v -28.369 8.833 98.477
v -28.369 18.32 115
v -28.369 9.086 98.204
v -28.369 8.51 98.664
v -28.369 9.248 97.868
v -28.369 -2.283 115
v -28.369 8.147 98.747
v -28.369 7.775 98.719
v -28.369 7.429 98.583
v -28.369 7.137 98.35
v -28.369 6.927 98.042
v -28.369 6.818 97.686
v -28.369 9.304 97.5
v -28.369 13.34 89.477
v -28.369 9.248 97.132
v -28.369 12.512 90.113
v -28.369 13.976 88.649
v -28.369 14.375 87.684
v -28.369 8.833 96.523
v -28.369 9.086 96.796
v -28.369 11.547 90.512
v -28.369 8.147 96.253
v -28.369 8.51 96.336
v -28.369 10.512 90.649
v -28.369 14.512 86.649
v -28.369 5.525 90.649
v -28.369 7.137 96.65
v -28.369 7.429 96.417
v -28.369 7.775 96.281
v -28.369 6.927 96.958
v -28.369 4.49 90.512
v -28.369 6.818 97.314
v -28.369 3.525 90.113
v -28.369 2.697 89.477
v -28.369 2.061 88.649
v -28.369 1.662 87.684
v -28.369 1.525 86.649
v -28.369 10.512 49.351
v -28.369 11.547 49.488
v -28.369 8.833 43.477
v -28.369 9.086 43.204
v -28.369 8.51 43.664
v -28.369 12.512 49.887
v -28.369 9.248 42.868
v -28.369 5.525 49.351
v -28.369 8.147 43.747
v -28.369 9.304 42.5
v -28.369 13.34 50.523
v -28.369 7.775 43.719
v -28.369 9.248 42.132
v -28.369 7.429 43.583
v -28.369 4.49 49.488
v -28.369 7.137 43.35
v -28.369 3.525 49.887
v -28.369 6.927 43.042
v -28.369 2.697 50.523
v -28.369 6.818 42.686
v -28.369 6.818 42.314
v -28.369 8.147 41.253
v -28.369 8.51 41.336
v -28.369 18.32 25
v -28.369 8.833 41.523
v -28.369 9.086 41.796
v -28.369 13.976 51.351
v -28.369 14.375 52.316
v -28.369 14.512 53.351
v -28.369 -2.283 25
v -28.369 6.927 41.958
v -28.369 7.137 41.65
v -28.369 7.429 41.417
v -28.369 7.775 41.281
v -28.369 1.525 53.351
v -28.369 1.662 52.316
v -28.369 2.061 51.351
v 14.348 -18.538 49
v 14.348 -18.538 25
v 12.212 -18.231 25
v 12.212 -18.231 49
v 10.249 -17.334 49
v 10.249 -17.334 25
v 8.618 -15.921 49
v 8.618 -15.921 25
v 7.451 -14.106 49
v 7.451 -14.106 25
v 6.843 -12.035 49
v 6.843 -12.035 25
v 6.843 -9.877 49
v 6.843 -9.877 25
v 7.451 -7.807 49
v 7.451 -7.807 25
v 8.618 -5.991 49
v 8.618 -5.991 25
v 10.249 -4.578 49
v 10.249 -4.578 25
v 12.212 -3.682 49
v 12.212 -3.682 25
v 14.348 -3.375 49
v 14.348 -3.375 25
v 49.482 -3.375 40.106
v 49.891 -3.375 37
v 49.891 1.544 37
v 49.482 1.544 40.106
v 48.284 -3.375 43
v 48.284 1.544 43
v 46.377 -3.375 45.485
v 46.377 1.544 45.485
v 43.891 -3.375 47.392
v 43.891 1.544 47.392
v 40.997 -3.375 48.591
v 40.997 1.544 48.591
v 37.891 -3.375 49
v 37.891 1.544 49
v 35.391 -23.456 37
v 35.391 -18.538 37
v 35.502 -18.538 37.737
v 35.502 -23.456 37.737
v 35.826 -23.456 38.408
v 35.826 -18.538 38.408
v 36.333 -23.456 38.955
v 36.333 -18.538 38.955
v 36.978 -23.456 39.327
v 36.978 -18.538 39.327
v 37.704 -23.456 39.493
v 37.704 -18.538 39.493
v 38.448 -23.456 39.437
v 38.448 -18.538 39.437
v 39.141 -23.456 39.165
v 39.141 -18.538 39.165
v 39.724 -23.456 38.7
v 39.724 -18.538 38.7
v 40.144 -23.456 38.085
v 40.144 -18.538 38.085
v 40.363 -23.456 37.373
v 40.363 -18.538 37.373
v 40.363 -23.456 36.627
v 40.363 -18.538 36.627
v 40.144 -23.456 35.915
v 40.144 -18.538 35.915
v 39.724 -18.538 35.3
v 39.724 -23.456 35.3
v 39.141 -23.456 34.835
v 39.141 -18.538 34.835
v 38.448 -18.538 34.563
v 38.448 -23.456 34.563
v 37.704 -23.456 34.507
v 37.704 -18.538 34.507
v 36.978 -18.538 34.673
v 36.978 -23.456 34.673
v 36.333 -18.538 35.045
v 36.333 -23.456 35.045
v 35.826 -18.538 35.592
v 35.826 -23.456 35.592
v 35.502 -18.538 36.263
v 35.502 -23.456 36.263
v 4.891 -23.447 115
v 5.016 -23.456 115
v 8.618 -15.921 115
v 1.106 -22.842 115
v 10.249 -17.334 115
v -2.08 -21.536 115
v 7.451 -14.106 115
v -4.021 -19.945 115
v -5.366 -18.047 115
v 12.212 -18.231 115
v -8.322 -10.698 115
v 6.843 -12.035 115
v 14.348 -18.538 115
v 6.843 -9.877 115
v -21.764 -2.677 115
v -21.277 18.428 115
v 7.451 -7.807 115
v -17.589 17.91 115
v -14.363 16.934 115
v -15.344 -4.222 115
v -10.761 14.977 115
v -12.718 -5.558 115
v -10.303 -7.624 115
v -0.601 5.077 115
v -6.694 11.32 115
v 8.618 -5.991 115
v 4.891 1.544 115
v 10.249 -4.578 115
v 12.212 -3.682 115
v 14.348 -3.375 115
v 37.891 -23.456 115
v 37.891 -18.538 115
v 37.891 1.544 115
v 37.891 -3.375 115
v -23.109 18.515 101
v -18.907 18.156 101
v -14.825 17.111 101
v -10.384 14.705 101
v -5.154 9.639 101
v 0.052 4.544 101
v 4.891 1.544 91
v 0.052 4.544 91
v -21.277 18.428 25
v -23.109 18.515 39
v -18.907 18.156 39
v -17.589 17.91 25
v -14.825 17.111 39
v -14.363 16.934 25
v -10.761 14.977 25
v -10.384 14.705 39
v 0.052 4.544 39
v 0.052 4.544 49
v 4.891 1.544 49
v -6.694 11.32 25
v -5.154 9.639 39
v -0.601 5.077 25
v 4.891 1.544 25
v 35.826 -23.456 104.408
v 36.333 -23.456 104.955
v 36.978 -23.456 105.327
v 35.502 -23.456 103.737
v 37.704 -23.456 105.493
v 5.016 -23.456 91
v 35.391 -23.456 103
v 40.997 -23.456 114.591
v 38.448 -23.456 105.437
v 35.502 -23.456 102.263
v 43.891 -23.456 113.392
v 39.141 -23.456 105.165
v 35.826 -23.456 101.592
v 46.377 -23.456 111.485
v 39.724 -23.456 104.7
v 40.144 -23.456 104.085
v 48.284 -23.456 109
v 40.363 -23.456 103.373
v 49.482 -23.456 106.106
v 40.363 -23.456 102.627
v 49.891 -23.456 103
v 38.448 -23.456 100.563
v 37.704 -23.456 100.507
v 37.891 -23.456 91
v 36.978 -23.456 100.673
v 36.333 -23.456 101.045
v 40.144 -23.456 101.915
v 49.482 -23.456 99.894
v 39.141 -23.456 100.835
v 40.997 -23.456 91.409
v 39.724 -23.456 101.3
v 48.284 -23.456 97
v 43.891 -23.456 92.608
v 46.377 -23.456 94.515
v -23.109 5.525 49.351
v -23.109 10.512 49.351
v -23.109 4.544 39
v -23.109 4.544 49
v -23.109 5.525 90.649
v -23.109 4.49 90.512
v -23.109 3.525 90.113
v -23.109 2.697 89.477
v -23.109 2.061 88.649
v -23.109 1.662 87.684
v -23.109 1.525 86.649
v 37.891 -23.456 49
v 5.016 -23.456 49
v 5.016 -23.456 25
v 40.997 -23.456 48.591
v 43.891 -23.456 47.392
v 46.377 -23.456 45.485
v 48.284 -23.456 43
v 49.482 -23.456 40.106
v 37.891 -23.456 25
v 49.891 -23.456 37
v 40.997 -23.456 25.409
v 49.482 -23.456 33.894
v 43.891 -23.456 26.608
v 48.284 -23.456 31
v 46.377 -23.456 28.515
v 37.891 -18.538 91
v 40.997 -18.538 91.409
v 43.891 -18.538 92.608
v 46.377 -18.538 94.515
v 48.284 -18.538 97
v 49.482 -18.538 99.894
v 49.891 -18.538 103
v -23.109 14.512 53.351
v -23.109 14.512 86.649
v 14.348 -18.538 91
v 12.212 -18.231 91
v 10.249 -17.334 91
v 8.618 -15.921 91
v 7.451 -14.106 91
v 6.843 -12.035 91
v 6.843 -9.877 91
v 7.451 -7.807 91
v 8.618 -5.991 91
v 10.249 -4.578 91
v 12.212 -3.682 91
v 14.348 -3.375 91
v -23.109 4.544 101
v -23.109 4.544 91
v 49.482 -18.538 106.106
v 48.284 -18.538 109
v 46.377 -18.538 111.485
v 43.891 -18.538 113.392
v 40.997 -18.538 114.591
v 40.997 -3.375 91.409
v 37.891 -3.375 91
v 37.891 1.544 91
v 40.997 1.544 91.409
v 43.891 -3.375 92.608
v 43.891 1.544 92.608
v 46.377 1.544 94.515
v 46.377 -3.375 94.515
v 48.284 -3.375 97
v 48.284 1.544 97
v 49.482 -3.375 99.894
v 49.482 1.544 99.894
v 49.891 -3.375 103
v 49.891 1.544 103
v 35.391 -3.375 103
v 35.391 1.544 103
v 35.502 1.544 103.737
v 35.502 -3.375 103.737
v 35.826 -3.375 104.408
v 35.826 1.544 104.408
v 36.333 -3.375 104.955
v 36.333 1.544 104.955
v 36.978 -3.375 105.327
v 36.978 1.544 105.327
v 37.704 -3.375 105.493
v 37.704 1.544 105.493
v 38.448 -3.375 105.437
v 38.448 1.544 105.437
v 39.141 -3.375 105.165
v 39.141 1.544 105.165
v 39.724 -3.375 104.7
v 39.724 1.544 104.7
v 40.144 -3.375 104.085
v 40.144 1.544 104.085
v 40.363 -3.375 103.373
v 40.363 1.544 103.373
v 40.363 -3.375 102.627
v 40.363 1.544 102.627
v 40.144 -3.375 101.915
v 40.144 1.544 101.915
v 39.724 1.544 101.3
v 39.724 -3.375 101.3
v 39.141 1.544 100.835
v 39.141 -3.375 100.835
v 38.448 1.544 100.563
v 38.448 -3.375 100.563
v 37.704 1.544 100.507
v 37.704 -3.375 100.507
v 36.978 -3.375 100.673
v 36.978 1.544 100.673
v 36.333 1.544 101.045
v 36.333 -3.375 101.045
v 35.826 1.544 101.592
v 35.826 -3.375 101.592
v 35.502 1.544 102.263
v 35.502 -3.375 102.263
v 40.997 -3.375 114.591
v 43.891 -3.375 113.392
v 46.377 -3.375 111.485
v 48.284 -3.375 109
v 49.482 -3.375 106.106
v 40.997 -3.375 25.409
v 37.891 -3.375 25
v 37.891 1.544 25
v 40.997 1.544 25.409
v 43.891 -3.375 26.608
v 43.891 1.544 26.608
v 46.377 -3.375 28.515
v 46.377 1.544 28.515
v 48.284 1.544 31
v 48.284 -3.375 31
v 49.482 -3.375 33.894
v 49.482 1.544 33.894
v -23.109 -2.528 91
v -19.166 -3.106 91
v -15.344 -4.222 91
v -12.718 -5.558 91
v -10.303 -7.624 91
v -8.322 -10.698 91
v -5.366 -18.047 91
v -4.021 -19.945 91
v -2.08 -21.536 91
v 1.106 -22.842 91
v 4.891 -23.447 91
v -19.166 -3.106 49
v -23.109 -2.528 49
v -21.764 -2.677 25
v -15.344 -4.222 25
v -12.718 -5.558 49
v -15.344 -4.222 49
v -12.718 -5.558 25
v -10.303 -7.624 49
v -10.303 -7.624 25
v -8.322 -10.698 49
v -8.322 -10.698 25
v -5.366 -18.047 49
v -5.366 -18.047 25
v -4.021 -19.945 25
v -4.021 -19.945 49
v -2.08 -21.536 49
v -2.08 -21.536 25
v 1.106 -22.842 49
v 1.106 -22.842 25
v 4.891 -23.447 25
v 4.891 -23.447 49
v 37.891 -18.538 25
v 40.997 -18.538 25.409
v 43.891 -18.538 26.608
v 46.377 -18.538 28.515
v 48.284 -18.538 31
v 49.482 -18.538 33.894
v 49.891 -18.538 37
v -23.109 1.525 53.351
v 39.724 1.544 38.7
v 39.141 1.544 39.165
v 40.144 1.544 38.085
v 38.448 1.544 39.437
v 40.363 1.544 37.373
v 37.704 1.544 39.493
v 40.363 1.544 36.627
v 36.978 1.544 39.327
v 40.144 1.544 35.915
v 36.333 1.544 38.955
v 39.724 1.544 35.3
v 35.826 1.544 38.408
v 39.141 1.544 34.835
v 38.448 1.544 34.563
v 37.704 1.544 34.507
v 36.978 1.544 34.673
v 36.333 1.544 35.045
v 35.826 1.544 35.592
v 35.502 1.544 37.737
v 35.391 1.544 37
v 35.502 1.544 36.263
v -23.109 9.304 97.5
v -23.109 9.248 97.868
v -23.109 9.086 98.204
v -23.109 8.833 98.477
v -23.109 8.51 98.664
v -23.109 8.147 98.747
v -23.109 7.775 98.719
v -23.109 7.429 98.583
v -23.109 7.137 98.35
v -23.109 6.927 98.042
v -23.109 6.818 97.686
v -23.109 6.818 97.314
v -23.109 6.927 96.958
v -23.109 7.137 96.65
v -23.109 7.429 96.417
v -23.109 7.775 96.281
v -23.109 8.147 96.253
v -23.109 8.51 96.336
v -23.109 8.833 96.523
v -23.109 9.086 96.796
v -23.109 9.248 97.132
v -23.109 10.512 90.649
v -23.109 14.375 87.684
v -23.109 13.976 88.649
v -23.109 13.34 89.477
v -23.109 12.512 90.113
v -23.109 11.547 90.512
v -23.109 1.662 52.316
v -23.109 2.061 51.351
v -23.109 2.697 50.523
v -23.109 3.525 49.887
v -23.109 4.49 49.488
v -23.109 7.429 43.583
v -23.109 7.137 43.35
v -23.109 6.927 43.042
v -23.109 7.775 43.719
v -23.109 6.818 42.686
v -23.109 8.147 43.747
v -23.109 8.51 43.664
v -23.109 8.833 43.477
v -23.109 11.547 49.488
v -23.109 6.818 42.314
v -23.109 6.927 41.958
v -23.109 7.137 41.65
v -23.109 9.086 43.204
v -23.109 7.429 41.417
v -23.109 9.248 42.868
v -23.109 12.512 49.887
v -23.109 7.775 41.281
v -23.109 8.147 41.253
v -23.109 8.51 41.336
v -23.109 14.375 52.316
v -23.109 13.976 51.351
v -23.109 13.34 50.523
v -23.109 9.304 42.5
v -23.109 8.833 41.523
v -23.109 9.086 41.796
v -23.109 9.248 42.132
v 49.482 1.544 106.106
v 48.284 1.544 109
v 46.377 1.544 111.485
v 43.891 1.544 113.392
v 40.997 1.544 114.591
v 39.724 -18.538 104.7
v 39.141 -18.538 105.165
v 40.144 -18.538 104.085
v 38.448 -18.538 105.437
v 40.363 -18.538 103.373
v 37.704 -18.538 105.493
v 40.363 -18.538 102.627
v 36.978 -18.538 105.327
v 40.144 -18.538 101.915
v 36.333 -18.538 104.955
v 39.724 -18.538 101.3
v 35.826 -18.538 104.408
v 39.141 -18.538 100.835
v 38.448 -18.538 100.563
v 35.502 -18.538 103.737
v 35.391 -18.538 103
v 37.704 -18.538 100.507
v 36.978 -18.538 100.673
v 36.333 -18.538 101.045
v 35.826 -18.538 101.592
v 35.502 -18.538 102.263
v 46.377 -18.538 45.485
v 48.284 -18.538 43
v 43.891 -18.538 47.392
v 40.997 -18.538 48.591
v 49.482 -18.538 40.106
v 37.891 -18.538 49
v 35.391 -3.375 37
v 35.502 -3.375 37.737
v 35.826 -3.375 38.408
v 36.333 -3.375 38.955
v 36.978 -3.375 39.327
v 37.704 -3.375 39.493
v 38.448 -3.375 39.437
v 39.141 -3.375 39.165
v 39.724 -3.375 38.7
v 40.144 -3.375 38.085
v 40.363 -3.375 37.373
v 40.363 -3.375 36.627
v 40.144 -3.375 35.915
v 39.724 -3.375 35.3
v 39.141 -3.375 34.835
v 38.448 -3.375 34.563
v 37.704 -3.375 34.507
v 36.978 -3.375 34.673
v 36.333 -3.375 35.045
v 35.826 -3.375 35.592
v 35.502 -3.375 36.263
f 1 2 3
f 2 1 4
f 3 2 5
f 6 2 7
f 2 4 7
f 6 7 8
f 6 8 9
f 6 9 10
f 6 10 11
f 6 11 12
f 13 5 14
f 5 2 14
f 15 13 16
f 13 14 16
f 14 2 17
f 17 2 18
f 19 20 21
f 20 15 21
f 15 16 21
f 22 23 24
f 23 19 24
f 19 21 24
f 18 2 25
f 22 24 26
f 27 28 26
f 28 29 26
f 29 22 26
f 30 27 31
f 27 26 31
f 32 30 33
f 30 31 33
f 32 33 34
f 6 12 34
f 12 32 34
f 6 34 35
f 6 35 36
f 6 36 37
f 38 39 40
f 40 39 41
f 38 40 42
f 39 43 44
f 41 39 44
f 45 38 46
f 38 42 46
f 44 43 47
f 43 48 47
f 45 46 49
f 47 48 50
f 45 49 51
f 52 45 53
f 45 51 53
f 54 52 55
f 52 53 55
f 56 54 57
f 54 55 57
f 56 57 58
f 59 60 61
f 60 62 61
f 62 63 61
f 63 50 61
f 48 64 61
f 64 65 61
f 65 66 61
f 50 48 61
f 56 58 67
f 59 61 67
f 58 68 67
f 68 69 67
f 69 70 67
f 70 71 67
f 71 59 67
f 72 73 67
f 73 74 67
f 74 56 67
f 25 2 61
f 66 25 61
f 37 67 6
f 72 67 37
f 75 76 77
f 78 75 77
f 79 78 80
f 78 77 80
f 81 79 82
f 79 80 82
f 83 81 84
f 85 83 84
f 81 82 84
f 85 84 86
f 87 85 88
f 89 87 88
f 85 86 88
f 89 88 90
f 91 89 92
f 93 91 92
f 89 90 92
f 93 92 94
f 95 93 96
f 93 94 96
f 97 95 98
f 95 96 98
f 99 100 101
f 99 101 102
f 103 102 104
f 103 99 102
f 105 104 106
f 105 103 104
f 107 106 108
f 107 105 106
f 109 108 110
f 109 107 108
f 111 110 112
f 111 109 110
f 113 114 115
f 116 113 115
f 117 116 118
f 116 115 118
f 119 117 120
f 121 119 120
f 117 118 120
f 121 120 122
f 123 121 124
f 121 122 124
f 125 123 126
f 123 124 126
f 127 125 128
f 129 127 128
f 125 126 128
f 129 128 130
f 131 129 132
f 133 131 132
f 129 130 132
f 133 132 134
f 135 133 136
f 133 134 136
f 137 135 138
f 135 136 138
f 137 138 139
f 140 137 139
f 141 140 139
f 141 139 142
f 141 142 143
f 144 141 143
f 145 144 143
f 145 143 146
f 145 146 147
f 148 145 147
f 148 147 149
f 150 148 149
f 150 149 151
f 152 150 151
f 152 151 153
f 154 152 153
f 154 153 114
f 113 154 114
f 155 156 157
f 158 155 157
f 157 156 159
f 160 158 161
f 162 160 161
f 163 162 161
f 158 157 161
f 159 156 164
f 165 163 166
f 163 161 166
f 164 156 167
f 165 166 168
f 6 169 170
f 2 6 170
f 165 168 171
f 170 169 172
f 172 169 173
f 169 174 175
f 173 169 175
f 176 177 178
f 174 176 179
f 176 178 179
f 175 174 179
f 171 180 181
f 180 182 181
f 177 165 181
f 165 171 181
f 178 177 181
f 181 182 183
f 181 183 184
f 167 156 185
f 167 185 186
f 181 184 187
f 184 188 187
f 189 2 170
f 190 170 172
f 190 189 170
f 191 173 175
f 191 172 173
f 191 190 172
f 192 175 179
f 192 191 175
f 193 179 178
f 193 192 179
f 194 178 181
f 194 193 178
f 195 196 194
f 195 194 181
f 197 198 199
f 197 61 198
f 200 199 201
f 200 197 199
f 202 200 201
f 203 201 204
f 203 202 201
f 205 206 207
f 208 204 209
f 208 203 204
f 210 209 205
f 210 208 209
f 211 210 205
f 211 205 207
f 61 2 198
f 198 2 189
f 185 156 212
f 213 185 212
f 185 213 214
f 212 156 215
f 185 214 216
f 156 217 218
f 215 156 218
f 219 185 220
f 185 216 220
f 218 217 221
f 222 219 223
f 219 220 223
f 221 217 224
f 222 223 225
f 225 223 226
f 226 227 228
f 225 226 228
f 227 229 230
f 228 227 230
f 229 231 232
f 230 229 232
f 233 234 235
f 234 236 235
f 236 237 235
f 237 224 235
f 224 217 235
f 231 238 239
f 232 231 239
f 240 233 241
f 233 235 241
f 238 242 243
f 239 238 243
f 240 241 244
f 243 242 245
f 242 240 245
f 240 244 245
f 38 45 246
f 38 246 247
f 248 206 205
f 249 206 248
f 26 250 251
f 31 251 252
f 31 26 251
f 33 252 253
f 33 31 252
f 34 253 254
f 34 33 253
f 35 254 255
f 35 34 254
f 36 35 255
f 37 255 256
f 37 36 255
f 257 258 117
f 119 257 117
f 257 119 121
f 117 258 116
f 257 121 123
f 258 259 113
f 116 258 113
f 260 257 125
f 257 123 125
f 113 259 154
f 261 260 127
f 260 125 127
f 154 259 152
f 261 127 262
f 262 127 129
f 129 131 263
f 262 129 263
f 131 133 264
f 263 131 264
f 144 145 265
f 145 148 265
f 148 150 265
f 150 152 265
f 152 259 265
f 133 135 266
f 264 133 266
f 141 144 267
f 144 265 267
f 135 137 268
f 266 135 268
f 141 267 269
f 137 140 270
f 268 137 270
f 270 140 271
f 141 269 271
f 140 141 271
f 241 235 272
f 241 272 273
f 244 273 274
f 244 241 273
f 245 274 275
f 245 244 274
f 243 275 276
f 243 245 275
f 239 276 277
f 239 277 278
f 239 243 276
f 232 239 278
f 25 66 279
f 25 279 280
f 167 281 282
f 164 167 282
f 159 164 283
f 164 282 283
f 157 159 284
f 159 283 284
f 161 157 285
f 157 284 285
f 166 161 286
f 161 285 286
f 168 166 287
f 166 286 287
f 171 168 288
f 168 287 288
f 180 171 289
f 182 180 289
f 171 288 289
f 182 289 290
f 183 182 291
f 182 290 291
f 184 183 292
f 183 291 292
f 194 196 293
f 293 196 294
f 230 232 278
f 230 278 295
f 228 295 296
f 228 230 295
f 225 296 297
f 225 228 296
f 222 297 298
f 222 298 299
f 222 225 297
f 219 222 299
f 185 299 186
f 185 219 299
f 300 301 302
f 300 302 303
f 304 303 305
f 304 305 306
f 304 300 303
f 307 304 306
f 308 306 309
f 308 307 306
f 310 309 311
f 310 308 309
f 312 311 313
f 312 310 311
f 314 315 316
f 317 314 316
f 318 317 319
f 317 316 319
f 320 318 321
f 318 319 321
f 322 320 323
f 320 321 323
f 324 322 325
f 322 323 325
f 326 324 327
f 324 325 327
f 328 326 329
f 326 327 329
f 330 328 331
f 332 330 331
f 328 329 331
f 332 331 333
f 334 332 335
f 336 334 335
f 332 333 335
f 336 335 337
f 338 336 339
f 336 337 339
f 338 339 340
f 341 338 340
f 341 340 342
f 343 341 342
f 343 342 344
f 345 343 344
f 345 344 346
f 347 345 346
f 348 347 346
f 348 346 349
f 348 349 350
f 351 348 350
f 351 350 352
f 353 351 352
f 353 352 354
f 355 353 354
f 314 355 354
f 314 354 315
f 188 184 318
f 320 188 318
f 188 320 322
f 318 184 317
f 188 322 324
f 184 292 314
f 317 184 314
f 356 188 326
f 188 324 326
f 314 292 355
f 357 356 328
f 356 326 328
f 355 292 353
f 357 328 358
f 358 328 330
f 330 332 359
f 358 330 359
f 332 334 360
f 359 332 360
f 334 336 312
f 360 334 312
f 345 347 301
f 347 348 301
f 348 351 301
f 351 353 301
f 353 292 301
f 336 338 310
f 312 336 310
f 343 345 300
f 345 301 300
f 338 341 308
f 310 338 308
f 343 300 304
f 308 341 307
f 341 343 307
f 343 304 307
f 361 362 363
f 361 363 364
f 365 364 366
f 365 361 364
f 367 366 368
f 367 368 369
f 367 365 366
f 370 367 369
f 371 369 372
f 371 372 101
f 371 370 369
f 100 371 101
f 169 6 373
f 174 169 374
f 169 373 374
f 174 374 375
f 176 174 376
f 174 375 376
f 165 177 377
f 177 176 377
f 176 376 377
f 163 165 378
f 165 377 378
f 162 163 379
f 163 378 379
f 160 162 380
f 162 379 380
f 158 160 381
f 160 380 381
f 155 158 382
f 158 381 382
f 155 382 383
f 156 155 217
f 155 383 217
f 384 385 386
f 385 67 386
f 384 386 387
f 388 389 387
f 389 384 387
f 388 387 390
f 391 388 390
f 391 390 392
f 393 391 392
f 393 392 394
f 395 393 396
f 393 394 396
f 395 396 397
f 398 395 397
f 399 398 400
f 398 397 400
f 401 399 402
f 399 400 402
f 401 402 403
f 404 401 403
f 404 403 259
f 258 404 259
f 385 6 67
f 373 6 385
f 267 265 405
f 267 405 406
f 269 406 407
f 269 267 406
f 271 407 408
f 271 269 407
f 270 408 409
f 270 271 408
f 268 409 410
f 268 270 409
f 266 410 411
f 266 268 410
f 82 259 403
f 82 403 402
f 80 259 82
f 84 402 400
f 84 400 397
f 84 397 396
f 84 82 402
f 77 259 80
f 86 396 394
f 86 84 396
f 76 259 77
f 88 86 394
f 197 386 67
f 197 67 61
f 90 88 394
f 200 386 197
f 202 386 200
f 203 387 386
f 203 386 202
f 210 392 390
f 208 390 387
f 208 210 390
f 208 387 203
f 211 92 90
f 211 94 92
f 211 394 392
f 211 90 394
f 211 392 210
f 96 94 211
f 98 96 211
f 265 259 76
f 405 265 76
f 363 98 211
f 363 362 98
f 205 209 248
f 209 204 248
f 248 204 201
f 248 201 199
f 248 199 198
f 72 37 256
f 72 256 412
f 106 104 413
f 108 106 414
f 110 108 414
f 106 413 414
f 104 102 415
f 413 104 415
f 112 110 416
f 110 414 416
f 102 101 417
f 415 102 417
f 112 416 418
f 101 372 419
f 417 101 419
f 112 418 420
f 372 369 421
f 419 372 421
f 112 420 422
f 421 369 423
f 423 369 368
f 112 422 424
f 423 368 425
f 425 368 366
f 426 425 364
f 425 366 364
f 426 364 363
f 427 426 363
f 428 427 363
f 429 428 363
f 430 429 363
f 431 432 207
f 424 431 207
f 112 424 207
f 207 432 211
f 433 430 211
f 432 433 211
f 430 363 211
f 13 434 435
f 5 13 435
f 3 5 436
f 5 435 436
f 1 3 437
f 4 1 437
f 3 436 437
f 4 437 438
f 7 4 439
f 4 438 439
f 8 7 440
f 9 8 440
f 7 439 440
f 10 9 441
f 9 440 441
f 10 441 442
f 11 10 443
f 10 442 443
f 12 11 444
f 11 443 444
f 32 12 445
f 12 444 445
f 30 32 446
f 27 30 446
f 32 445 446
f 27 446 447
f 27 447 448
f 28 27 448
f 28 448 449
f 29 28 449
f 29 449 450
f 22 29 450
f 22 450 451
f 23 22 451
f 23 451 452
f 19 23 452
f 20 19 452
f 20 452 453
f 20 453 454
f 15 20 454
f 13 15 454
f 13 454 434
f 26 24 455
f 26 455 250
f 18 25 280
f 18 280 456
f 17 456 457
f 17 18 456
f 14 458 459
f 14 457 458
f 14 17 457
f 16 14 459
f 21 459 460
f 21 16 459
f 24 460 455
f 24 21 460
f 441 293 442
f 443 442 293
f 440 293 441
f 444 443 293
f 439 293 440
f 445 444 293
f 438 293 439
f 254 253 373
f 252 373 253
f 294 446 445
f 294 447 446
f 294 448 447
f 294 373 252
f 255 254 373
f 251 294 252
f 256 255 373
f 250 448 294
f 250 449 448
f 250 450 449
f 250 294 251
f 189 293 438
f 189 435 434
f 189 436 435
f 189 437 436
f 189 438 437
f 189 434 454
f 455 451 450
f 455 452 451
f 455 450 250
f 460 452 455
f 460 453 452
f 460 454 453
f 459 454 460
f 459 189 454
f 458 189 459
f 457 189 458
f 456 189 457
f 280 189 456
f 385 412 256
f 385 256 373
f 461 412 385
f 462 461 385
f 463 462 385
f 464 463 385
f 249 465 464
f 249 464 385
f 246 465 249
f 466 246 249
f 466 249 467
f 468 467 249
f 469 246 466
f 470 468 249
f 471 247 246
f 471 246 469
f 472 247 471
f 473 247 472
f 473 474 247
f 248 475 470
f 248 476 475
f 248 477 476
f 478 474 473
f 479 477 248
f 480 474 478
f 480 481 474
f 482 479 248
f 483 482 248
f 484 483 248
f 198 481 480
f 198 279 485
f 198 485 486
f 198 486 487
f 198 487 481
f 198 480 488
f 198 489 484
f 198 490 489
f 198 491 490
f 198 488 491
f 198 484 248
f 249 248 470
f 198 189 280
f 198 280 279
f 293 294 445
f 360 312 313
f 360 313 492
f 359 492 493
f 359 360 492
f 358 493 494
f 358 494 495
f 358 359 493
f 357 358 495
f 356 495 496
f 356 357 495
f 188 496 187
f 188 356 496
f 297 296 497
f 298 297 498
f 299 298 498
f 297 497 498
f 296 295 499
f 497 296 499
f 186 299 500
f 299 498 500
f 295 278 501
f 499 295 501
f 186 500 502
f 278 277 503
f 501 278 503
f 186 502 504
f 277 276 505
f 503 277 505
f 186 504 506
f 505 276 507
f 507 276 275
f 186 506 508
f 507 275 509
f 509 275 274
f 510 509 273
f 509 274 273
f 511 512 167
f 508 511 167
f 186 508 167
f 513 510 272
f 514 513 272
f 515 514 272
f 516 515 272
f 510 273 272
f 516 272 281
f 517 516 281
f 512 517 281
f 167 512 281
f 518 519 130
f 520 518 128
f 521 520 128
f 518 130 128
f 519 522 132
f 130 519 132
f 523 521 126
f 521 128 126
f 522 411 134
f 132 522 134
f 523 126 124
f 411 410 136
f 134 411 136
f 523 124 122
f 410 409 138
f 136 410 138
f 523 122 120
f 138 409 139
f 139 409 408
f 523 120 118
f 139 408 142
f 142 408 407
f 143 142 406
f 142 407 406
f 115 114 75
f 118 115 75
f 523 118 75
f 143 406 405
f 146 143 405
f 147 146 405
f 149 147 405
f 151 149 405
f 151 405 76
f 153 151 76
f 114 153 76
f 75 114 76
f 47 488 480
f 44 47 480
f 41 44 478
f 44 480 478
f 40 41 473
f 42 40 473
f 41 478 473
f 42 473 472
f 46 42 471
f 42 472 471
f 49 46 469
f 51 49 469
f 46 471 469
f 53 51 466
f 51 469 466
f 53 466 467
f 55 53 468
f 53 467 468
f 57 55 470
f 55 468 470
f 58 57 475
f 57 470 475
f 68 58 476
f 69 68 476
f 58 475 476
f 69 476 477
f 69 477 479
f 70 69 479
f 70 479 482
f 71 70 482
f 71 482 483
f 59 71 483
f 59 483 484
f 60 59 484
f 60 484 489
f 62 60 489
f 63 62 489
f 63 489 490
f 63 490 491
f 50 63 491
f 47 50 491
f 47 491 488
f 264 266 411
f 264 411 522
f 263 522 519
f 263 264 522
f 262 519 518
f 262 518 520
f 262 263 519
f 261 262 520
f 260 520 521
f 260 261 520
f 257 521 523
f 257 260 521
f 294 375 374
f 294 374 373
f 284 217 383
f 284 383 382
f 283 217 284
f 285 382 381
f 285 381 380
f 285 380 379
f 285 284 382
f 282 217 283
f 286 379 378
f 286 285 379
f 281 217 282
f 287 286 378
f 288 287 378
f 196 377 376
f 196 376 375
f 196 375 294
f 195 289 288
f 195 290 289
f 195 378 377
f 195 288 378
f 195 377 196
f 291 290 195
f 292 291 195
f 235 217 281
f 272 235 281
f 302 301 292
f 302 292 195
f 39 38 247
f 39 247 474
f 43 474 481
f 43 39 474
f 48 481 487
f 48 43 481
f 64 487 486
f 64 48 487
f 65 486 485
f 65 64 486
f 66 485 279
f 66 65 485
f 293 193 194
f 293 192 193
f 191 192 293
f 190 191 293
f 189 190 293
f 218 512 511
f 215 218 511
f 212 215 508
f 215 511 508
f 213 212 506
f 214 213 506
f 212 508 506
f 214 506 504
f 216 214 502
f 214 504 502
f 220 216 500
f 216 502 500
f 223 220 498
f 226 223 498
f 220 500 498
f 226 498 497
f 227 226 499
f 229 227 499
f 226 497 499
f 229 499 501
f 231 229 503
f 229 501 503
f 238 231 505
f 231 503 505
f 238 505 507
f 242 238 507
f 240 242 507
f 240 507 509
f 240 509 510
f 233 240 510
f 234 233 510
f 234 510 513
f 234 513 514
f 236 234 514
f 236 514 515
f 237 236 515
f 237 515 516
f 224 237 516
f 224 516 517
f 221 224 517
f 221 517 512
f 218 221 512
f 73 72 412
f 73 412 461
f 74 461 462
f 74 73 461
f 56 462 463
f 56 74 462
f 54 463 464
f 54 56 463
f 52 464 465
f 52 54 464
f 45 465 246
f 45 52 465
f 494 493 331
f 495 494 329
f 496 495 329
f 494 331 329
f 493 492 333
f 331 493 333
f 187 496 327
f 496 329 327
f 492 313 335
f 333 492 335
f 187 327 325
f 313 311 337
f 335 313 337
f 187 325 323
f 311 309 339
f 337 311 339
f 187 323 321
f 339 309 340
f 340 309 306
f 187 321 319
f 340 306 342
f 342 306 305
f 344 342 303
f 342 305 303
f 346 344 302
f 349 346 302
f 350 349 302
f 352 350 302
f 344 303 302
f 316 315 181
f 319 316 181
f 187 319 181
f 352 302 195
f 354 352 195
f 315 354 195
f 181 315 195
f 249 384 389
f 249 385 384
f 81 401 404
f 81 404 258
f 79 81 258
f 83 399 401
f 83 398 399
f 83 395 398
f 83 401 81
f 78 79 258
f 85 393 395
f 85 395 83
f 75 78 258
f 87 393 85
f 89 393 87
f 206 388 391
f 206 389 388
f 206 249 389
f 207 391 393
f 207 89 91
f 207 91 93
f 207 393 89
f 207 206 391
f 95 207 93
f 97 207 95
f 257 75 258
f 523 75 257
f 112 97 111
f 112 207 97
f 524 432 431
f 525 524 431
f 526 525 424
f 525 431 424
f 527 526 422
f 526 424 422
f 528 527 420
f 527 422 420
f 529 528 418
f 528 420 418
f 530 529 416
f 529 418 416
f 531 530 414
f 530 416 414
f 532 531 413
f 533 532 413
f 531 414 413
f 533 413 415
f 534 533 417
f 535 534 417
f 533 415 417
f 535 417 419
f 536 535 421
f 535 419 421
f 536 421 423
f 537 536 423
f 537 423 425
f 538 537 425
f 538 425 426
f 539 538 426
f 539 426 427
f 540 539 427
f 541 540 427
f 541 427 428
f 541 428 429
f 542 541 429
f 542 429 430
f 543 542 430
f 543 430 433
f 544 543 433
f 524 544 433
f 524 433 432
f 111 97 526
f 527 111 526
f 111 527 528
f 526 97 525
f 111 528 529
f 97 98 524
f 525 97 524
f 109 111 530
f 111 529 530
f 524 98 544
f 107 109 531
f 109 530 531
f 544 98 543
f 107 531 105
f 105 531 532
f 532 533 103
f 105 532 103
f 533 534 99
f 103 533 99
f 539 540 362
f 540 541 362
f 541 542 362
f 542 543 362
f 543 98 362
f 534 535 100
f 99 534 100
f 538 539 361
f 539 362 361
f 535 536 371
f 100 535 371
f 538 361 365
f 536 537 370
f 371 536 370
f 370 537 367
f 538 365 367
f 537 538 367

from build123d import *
from OCP.BRepAlgoAPI import BRepAlgoAPI_Cut
from OCP.TopTools import TopTools_ListOfShape

# Parameters (mm, degrees)
BOSS_EXTRUDE1_DEPTH = 140
SKETCH2_W           = 45
SKETCH2_H           = 25
SKETCH2_H_2         = 42
CUT_EXTRUDE1_DEPTH  = 151.712117272
SKETCH3_W           = 25
SKETCH3_H           = 58.39699261
SKETCH3_H_2         = 53.941763905
CUT_EXTRUDE2_DEPTH  = 149.913368614
CUT_EXTRUDE3_START  = -25
CUT_EXTRUDE3_DEPTH  = 25
SKETCH5_R           = 2.5
CUT_EXTRUDE4_DEPTH  = 128.82465442
SKETCH6_W           = 42
SKETCH6_H           = 41.970965134
CUT_EXTRUDE5_DEPTH  = 28
M3_TAPPED_HOLE1_D   = 2.5
CUT_EXTRUDE7_DEPTH  = 10
CUT_EXTRUDE8_DEPTH  = 10
CUT_EXTRUDE9_DEPTH  = 142.067055339


with BuildPart() as part:
    # Sketch1 → Boss-Extrude1 (new body)
    with BuildSketch(Plane.XY):
        with BuildLine():
            Line((-28.369303649, 18.31966037), (-28.369303649, -2.282608696))
            add(Edge.make_bspline(
                [(-28.369303649, -2.282608696), (2.684029018, -2.430944497), (-15.214915802, -21.968601645), (5.015839683, -23.456157195)],
                knots=[0, 0, 0, 0, 1, 1, 1, 1], degree=3))
            Line((5.015839683, -23.456157195), (49.891304348, -23.456157195))
            Line((49.891304348, -23.456157195), (49.891304348, -18.537678935))
            Line((49.891304348, -18.537678935), (14.347826087, -18.537678935))
            ThreePointArc((14.347826087, -18.537678935), (6.766304348, -10.956157195), (14.347826087, -3.374635456))
            Line((14.347826087, -3.374635456), (49.891304348, -3.374635456))
            Line((49.891304348, -3.374635456), (49.891304348, 1.543842805))
            Line((49.891304348, 1.543842805), (4.891304348, 1.543842805))
            add(Edge.make_bspline(
                [(-28.369303649, 18.31966037), (-6.165269931, 20.270771045), (-8.304675764, 7.778503855), (4.891304348, 1.543842805)],
                knots=[0, 0, 0, 0, 1, 1, 1, 1], degree=3))
        make_face()
    extrude(amount=BOSS_EXTRUDE1_DEPTH)

    # Sketch2 → Cut-Extrude1 (cut, through all)
    with BuildSketch(Plane(origin=(0, 1.543842805, 0), x_dir=(1, 0, 0), z_dir=(0, 1, 0))):
        with Locations((27.391304348, -12.5)):
            Rectangle(SKETCH2_W, SKETCH2_H)
        with Locations((27.391304348, -70)):
            Rectangle(SKETCH2_W, SKETCH2_H_2)
        with Locations((27.391304348, -127.5)):
            Rectangle(SKETCH2_W, SKETCH2_H)
    extrude(amount=-CUT_EXTRUDE1_DEPTH, mode=Mode.SUBTRACT)

    # Sketch3 → Cut-Extrude2 (cut, through all)
    with BuildSketch(Plane(origin=(4.891304348, 0, 0), x_dir=(0, 0, -1), z_dir=(1, 0, 0))):
        with Locations((-127.5, 5.751761195)):
            Rectangle(SKETCH3_W, SKETCH3_H)
        with Locations((-12.5, 3.524146843)):
            Rectangle(SKETCH3_W, SKETCH3_H_2)
    extrude(amount=-CUT_EXTRUDE2_DEPTH, mode=Mode.SUBTRACT)


with BuildPart() as cut_extrude3_tool:
    # Cut-Extrude3: read off the stored shape, not the designer's step
    # Cut-Extrude3 outline → Cut-Extrude3 (new body)
    with BuildSketch(Plane(origin=(0, 1.543842805, 0), x_dir=(1, 0, 0), z_dir=(0, 1, 0)).offset(CUT_EXTRUDE3_START)):
        with BuildLine():
            ThreePointArc((37.891304348, -91), (46.376584834, -94.514719112), (49.891302974, -103))
            Line((49.891302974, -103), (49.891304348, -91))
            Line((49.891304348, -91), (37.891304348, -91))
        make_face()
        with BuildLine():
            ThreePointArc((49.891302974, -103), (46.376583863, -111.48528186), (37.891301601, -115))
            Line((37.891301601, -115), (49.891304348, -115))
            Line((49.891304348, -115), (49.891302974, -103))
        make_face()
        with BuildLine():
            ThreePointArc((37.891303148, -25), (46.376585298, -28.514718201), (49.891304348, -37))
            Line((49.891304348, -37), (49.891304348, -25))
            Line((49.891304348, -25), (37.891303148, -25))
        make_face()
        with BuildLine():
            ThreePointArc((49.891304348, -37), (46.376585294, -45.485281802), (37.891303138, -49))
            Line((37.891303138, -49), (49.891304348, -49))
            Line((49.891304348, -49), (49.891304348, -37))
        make_face()
    extrude(amount=CUT_EXTRUDE3_DEPTH)


with BuildPart() as part_1:
    add(part.part)

    # Cut-Extrude3: cut by cut_extrude3_tool, with a tolerance
    cut_extrude3_stock = TopTools_ListOfShape()
    cut_extrude3_stock.Append(part_1.part.wrapped)
    cut_extrude3_tools = TopTools_ListOfShape()
    cut_extrude3_tools.Append(cut_extrude3_tool.part.wrapped)
    cut_extrude3_cut = BRepAlgoAPI_Cut()
    cut_extrude3_cut.SetArguments(cut_extrude3_stock)
    cut_extrude3_cut.SetTools(cut_extrude3_tools)
    cut_extrude3_cut.SetFuzzyValue(0.00001)
    cut_extrude3_cut.Build()
    add(Compound.cast(cut_extrude3_cut.Shape()).solids(), mode=Mode.REPLACE)

    # Sketch5 → Cut-Extrude4 (cut, through all)
    with BuildSketch(Plane(origin=(0, 1.543842805, 0), x_dir=(1, 0, 0), z_dir=(0, 1, 0))):
        with Locations(Location((37.891304348, -37, 0), (0, 0, 180))):
            Circle(SKETCH5_R)
        with Locations(Location((37.891302974, -103, 0), (0, 0, 180))):
            Circle(SKETCH5_R)
    extrude(amount=-CUT_EXTRUDE4_DEPTH, mode=Mode.SUBTRACT)

    # Sketch6 → Cut-Extrude5 (cut)
    with BuildSketch(Plane(origin=(4.891304348, 0, 0), x_dir=(0, 0, -1), z_dir=(1, 0, 0))):
        with Locations((-70, -2.461252543)):
            Rectangle(SKETCH6_W, SKETCH6_H)
    extrude(amount=-CUT_EXTRUDE5_DEPTH, mode=Mode.SUBTRACT)

    # M3 Tapped Hole1 (through all)
    with Locations(Plane(origin=(-28.369303649, 8.053562831, 42.5), x_dir=(0, -1, 0), z_dir=(-1, 0, 0))):
        with Locations((0, 0), (0, 55)):
            Hole(M3_TAPPED_HOLE1_D / 2)

    # Sketch10 → Cut-Extrude7 (cut)
    with BuildSketch(Plane(origin=(0, 0, 91), x_dir=(-1, 0, 0), z_dir=(0, 0, -1))):
        Polygon((-6.055554522, 4.543842805), (23.108695652, 4.543842805), (23.108695652, 21.156391706), (-12.385539101, 21.156391706), align=None)
    extrude(amount=-CUT_EXTRUDE7_DEPTH, mode=Mode.SUBTRACT)

    # Sketch12 → Cut-Extrude8 (cut)
    with BuildSketch(Plane.XY.offset(49)):
        Polygon((10.285273621, 4.543842805), (-23.108695652, 4.543842805), (-23.108695652, 23.852692611), (13.93451424, 23.852692611), align=None)
    extrude(amount=-CUT_EXTRUDE8_DEPTH, mode=Mode.SUBTRACT)

    # Sketch13 → Cut-Extrude9 (cut, through all)
    with BuildSketch(Plane.ZY.offset(28.369303649)):
        with BuildLine():
            Line((86.648776757, 1.525435208), (53.351223243, 1.525435208))
            ThreePointArc((53.351223243, 1.525435208), (50.522796118, 2.697008083), (49.351223243, 5.525435208))
            Line((49.351223243, 5.525435208), (49.351223243, 10.511616467))
            ThreePointArc((49.351223243, 10.511616467), (50.522796118, 13.340043592), (53.351223243, 14.511616467))
            Line((53.351223243, 14.511616467), (86.648776757, 14.511616467))
            ThreePointArc((86.648776757, 14.511616467), (89.477203882, 13.340043592), (90.648776757, 10.511616467))
            Line((90.648776757, 10.511616467), (90.648776757, 5.525435208))
            ThreePointArc((90.648776757, 5.525435208), (89.477203882, 2.697008083), (86.648776757, 1.525435208))
        make_face()
    extrude(amount=-CUT_EXTRUDE9_DEPTH, mode=Mode.SUBTRACT)


solid = part_1.part
